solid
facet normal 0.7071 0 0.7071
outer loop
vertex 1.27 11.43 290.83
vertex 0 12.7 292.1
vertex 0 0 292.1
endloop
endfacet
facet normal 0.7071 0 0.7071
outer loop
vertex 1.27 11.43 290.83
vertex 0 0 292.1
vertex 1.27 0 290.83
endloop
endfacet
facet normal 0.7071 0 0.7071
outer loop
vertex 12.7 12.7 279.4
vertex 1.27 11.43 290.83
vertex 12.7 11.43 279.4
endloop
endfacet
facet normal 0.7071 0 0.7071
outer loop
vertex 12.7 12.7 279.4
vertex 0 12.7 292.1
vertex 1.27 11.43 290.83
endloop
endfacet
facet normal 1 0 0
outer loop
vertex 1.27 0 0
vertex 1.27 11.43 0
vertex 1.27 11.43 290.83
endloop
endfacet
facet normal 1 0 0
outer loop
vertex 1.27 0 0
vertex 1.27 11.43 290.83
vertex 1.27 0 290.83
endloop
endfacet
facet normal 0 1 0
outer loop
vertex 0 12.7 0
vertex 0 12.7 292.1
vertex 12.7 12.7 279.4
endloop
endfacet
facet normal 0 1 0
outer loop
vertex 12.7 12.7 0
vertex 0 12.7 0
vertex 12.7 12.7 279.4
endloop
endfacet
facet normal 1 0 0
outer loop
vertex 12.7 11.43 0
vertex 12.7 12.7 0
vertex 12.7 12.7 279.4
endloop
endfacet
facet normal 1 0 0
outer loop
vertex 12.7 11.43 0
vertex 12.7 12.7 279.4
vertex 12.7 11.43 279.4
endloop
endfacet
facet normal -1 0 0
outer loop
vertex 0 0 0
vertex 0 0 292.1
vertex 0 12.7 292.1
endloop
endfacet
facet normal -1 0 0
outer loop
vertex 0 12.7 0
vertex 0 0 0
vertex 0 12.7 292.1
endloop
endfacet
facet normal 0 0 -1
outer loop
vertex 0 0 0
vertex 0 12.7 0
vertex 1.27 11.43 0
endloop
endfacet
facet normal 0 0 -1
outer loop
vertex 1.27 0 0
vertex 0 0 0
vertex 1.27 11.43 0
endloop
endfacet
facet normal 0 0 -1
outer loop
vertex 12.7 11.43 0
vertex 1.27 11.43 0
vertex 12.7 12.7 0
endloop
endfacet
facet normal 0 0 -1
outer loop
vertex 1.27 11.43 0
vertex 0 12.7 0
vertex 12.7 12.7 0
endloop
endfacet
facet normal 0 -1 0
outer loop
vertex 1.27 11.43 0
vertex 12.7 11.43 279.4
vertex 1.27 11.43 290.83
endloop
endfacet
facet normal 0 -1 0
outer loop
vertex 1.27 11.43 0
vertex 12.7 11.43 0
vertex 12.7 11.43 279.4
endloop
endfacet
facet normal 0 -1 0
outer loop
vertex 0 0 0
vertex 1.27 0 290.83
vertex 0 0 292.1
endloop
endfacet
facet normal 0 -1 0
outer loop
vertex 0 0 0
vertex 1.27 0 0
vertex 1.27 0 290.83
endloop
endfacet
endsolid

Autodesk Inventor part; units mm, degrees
ref_plane "YZ Plane" through (0, 0, 0) normal (1, 0, 0) x (0, 1, 0)
ref_plane "XZ Plane" through (0, 0, 0) normal (0, 1, 0) x (-1, 0, 0)
ref_plane "XY Plane" through (0, 0, 0) normal (0, 0, 1) x (1, 0, 0)
sketch "Sketch1" plane through (0, 0, 0) normal (0, 0, 1) x (1, 0, 0)
  line L0 (0, 0) -> (0, 12.7)
  line L1 (0, 12.7) -> (12.7, 12.7)
  line L2 (12.7, 12.7) -> (12.7, 11.43)
  line L3 (12.7, 11.43) -> (1.27, 11.43)
  line L4 (1.27, 11.43) -> (1.27, 0)
  line L5 (1.27, 0) -> (0, 0)
  dimension "d0" = 12.7
  dimension "d1" = 12.7
  dimension "d2" = 1.27
  dimension "d3" = 11.43
extrude "Extrusion1" add sketch "Sketch1" along normal blind 292.1
sketch "Sketch3" plane through (0, 12.7, 0) normal (0, 1, 0) x (1, 0, 0)
  line L0 (12.7, -292.1) -> (0, -292.1) projected
  line L1 (12.7, 0) -> (12.7, -292.1) projected
  line L2 (0, -292.1) -> (12.7, -279.4)
  dimension "d10" = 45
extrude "Extrusion3" cut sketch "Sketch3" against normal blind 25.4
properties part number "Aluminum Angle 3 Left" material "Aluminum 6061"
